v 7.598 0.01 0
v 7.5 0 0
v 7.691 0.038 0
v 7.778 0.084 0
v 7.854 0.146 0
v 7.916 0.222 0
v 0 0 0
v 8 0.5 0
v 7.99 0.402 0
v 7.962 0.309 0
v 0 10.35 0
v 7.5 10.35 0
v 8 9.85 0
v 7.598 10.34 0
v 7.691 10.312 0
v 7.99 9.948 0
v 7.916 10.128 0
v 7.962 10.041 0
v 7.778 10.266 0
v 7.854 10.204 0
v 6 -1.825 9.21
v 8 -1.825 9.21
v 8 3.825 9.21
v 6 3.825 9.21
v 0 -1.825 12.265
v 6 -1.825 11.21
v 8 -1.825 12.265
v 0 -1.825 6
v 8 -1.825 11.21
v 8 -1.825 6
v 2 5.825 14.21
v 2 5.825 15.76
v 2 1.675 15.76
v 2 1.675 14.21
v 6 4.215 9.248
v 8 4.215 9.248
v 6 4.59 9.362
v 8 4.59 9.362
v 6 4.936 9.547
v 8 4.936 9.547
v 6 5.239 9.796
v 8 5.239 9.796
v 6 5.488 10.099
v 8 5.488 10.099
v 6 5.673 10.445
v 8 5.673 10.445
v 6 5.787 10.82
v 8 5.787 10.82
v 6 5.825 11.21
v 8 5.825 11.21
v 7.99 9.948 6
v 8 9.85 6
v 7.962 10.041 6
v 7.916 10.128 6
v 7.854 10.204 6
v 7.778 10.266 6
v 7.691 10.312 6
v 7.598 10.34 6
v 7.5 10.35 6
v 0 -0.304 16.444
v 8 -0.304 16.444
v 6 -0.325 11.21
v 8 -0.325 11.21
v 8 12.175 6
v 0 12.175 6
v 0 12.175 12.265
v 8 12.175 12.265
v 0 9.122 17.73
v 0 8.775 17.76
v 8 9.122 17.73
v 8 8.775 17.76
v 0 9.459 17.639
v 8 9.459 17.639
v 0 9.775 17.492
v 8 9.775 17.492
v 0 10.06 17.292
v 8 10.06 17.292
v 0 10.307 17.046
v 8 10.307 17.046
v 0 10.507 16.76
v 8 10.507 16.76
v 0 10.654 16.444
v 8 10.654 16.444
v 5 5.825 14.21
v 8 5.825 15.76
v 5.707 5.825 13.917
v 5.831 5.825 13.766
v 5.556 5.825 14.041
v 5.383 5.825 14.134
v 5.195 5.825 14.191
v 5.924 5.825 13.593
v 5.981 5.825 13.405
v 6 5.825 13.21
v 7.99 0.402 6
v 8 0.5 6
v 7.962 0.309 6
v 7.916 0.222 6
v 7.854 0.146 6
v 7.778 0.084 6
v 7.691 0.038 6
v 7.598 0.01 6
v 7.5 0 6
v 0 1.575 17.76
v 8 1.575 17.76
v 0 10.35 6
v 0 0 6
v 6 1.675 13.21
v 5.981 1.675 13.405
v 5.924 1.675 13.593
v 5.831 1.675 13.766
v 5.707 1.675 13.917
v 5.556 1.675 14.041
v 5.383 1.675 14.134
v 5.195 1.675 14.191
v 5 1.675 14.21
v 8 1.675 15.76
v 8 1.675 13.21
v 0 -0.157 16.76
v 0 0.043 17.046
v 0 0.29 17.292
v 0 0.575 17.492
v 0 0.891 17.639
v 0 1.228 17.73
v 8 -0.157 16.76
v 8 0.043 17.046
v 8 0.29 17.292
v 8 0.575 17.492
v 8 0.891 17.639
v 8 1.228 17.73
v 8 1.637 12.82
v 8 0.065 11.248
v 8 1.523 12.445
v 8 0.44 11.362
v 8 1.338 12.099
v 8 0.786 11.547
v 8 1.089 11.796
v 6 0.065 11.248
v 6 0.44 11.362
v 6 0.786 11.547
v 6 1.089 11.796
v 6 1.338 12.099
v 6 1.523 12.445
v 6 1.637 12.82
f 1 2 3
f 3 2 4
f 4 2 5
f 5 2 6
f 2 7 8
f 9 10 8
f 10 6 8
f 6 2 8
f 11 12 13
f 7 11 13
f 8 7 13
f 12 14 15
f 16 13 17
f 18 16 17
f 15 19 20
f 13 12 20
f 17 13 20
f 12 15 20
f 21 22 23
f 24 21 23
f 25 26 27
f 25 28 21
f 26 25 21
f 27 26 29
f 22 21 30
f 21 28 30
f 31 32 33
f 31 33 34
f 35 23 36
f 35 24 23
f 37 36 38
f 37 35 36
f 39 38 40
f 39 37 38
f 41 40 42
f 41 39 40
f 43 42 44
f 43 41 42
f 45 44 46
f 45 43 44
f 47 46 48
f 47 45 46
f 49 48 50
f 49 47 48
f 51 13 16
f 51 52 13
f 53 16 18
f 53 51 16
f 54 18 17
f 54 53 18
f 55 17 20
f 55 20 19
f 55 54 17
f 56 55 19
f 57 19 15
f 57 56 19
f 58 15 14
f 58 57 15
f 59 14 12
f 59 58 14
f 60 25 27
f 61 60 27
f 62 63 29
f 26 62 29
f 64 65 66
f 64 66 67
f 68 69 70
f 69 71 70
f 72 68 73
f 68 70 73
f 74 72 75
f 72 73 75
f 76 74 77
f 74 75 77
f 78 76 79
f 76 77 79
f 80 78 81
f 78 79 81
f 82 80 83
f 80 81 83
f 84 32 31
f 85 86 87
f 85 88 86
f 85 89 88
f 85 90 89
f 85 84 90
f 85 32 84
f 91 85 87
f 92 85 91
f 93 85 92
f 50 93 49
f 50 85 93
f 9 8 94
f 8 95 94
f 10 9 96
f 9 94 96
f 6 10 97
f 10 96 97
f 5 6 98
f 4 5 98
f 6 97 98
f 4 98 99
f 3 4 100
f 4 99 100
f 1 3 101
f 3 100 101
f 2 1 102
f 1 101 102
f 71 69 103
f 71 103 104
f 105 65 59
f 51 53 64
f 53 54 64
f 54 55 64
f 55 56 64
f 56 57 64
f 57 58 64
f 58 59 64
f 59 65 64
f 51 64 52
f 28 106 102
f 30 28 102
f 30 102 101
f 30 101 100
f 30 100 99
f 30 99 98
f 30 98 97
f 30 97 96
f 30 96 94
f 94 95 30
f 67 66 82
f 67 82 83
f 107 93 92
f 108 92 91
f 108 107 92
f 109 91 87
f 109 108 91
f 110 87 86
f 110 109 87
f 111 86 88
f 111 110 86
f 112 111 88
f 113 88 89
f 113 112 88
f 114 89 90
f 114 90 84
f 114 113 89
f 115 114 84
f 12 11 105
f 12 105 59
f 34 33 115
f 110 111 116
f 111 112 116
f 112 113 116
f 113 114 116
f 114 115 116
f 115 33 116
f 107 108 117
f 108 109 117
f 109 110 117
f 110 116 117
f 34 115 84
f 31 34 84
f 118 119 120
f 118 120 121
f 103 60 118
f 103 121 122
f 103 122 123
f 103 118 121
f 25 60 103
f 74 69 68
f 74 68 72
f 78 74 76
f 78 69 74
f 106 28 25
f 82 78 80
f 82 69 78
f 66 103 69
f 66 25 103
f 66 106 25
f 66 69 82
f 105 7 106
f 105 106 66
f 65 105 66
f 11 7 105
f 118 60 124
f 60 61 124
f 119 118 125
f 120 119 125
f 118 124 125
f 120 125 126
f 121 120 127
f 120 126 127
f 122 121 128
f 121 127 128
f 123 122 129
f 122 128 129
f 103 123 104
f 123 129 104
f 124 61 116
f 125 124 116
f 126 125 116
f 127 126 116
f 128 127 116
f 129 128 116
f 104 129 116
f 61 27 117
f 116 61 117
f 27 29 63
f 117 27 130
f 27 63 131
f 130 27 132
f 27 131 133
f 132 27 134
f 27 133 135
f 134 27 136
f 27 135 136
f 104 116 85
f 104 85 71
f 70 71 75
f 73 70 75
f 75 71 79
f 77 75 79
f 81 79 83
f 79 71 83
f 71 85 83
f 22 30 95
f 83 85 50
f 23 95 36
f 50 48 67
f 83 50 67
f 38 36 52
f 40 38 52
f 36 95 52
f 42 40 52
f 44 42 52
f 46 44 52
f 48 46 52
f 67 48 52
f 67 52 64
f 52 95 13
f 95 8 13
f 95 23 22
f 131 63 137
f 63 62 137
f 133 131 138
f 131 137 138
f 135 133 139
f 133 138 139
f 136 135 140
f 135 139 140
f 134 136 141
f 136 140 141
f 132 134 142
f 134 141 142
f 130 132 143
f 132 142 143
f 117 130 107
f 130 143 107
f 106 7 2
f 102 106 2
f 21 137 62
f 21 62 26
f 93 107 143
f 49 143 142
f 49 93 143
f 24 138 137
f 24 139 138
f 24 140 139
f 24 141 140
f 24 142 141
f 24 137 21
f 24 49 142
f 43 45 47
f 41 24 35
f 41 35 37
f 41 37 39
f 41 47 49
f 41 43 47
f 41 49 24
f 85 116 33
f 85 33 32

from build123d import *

# Parameters (mm, degrees)
SKETCH1_W           = 8
SKETCH1_H           = 10.35
BOSS_EXTRUDE1_DEPTH = 6
SKETCH2_W           = 8
SKETCH2_H           = 14
BOSS_EXTRUDE2_DEPTH = 11.76
SKETCH3_W           = 1.55
SKETCH3_H           = 4.15
CUT_EXTRUDE1_DEPTH  = 6
CUT_EXTRUDE2_DEPTH  = 2
CHAMFER1_SIZE       = 2
CHAMFER1_SIZE2      = 5.494954839
FILLET1_R           = 2
FILLET2_R           = 2
FILLET3_R           = 1
FILLET5_R           = 0.5


with BuildPart() as part:
    # Sketch1 → Boss-Extrude1 (new body)
    with BuildSketch(Plane.XY):
        with Locations((4, 5.175)):
            Rectangle(SKETCH1_W, SKETCH1_H)
    extrude(amount=BOSS_EXTRUDE1_DEPTH)

    # Sketch2 → Boss-Extrude2 (add)
    with BuildSketch(Plane.XY.offset(6)):
        with Locations((4, 5.175)):
            Rectangle(SKETCH2_W, SKETCH2_H)
    extrude(amount=BOSS_EXTRUDE2_DEPTH)

    # Sketch3 → Cut-Extrude1 (cut)
    with BuildSketch(Plane(origin=(8, 0, 0), x_dir=(0, 0, -1), z_dir=(1, 0, 0))):
        with Locations((-14.985, 3.75)):
            Rectangle(SKETCH3_W, SKETCH3_H)
    extrude(amount=-CUT_EXTRUDE1_DEPTH, mode=Mode.SUBTRACT)

    # Sketch4 → Cut-Extrude2 (cut)
    with BuildSketch(Plane(origin=(8, 0, 0), x_dir=(0, 0, -1), z_dir=(1, 0, 0))):
        Polygon((-14.21, 1.675), (-11.21, 1.675), (-11.21, -1.825), (-9.21, -1.825), (-9.21, 5.825), (-14.21, 5.825), align=None)
    extrude(amount=-CUT_EXTRUDE2_DEPTH, mode=Mode.SUBTRACT)

    # Chamfer1
    chamfer1_edges = [part.edges().sort_by_distance(p)[0] for p in [
        (4, -1.825, 17.76),
        (4, 12.175, 17.76),
    ]]
    chamfer1_side = [part.faces().sort_by_distance(p)[0] for p in [
        (4, 5.175, 17.76),
    ]]
    chamfer(chamfer1_edges, length=CHAMFER1_SIZE, length2=CHAMFER1_SIZE2, reference=chamfer1_side[0])

    # Fillet1
    fillet1_edges = [part.edges().sort_by_distance(p)[0] for p in [
        (4, 0.175, 17.76),
        (4, 10.175, 17.76),
    ]]
    fillet(fillet1_edges, radius=FILLET1_R)

    # Fillet2
    fillet2_edges = [part.edges().sort_by_distance(p)[0] for p in [
        (7, 5.825, 9.21),
        (7, 1.675, 11.21),
    ]]
    fillet(fillet2_edges, radius=FILLET2_R)

    # Fillet3
    fillet3_edges = [part.edges().sort_by_distance(p)[0] for p in [
        (6, 3.75, 14.21),
    ]]
    fillet(fillet3_edges, radius=FILLET3_R)

    # Fillet5
    fillet5_edges = [part.edges().sort_by_distance(p)[0] for p in [
        (8, 10.35, 3),
        (8, 0, 3),
    ]]
    fillet(fillet5_edges, radius=FILLET5_R)


solid = part.part
